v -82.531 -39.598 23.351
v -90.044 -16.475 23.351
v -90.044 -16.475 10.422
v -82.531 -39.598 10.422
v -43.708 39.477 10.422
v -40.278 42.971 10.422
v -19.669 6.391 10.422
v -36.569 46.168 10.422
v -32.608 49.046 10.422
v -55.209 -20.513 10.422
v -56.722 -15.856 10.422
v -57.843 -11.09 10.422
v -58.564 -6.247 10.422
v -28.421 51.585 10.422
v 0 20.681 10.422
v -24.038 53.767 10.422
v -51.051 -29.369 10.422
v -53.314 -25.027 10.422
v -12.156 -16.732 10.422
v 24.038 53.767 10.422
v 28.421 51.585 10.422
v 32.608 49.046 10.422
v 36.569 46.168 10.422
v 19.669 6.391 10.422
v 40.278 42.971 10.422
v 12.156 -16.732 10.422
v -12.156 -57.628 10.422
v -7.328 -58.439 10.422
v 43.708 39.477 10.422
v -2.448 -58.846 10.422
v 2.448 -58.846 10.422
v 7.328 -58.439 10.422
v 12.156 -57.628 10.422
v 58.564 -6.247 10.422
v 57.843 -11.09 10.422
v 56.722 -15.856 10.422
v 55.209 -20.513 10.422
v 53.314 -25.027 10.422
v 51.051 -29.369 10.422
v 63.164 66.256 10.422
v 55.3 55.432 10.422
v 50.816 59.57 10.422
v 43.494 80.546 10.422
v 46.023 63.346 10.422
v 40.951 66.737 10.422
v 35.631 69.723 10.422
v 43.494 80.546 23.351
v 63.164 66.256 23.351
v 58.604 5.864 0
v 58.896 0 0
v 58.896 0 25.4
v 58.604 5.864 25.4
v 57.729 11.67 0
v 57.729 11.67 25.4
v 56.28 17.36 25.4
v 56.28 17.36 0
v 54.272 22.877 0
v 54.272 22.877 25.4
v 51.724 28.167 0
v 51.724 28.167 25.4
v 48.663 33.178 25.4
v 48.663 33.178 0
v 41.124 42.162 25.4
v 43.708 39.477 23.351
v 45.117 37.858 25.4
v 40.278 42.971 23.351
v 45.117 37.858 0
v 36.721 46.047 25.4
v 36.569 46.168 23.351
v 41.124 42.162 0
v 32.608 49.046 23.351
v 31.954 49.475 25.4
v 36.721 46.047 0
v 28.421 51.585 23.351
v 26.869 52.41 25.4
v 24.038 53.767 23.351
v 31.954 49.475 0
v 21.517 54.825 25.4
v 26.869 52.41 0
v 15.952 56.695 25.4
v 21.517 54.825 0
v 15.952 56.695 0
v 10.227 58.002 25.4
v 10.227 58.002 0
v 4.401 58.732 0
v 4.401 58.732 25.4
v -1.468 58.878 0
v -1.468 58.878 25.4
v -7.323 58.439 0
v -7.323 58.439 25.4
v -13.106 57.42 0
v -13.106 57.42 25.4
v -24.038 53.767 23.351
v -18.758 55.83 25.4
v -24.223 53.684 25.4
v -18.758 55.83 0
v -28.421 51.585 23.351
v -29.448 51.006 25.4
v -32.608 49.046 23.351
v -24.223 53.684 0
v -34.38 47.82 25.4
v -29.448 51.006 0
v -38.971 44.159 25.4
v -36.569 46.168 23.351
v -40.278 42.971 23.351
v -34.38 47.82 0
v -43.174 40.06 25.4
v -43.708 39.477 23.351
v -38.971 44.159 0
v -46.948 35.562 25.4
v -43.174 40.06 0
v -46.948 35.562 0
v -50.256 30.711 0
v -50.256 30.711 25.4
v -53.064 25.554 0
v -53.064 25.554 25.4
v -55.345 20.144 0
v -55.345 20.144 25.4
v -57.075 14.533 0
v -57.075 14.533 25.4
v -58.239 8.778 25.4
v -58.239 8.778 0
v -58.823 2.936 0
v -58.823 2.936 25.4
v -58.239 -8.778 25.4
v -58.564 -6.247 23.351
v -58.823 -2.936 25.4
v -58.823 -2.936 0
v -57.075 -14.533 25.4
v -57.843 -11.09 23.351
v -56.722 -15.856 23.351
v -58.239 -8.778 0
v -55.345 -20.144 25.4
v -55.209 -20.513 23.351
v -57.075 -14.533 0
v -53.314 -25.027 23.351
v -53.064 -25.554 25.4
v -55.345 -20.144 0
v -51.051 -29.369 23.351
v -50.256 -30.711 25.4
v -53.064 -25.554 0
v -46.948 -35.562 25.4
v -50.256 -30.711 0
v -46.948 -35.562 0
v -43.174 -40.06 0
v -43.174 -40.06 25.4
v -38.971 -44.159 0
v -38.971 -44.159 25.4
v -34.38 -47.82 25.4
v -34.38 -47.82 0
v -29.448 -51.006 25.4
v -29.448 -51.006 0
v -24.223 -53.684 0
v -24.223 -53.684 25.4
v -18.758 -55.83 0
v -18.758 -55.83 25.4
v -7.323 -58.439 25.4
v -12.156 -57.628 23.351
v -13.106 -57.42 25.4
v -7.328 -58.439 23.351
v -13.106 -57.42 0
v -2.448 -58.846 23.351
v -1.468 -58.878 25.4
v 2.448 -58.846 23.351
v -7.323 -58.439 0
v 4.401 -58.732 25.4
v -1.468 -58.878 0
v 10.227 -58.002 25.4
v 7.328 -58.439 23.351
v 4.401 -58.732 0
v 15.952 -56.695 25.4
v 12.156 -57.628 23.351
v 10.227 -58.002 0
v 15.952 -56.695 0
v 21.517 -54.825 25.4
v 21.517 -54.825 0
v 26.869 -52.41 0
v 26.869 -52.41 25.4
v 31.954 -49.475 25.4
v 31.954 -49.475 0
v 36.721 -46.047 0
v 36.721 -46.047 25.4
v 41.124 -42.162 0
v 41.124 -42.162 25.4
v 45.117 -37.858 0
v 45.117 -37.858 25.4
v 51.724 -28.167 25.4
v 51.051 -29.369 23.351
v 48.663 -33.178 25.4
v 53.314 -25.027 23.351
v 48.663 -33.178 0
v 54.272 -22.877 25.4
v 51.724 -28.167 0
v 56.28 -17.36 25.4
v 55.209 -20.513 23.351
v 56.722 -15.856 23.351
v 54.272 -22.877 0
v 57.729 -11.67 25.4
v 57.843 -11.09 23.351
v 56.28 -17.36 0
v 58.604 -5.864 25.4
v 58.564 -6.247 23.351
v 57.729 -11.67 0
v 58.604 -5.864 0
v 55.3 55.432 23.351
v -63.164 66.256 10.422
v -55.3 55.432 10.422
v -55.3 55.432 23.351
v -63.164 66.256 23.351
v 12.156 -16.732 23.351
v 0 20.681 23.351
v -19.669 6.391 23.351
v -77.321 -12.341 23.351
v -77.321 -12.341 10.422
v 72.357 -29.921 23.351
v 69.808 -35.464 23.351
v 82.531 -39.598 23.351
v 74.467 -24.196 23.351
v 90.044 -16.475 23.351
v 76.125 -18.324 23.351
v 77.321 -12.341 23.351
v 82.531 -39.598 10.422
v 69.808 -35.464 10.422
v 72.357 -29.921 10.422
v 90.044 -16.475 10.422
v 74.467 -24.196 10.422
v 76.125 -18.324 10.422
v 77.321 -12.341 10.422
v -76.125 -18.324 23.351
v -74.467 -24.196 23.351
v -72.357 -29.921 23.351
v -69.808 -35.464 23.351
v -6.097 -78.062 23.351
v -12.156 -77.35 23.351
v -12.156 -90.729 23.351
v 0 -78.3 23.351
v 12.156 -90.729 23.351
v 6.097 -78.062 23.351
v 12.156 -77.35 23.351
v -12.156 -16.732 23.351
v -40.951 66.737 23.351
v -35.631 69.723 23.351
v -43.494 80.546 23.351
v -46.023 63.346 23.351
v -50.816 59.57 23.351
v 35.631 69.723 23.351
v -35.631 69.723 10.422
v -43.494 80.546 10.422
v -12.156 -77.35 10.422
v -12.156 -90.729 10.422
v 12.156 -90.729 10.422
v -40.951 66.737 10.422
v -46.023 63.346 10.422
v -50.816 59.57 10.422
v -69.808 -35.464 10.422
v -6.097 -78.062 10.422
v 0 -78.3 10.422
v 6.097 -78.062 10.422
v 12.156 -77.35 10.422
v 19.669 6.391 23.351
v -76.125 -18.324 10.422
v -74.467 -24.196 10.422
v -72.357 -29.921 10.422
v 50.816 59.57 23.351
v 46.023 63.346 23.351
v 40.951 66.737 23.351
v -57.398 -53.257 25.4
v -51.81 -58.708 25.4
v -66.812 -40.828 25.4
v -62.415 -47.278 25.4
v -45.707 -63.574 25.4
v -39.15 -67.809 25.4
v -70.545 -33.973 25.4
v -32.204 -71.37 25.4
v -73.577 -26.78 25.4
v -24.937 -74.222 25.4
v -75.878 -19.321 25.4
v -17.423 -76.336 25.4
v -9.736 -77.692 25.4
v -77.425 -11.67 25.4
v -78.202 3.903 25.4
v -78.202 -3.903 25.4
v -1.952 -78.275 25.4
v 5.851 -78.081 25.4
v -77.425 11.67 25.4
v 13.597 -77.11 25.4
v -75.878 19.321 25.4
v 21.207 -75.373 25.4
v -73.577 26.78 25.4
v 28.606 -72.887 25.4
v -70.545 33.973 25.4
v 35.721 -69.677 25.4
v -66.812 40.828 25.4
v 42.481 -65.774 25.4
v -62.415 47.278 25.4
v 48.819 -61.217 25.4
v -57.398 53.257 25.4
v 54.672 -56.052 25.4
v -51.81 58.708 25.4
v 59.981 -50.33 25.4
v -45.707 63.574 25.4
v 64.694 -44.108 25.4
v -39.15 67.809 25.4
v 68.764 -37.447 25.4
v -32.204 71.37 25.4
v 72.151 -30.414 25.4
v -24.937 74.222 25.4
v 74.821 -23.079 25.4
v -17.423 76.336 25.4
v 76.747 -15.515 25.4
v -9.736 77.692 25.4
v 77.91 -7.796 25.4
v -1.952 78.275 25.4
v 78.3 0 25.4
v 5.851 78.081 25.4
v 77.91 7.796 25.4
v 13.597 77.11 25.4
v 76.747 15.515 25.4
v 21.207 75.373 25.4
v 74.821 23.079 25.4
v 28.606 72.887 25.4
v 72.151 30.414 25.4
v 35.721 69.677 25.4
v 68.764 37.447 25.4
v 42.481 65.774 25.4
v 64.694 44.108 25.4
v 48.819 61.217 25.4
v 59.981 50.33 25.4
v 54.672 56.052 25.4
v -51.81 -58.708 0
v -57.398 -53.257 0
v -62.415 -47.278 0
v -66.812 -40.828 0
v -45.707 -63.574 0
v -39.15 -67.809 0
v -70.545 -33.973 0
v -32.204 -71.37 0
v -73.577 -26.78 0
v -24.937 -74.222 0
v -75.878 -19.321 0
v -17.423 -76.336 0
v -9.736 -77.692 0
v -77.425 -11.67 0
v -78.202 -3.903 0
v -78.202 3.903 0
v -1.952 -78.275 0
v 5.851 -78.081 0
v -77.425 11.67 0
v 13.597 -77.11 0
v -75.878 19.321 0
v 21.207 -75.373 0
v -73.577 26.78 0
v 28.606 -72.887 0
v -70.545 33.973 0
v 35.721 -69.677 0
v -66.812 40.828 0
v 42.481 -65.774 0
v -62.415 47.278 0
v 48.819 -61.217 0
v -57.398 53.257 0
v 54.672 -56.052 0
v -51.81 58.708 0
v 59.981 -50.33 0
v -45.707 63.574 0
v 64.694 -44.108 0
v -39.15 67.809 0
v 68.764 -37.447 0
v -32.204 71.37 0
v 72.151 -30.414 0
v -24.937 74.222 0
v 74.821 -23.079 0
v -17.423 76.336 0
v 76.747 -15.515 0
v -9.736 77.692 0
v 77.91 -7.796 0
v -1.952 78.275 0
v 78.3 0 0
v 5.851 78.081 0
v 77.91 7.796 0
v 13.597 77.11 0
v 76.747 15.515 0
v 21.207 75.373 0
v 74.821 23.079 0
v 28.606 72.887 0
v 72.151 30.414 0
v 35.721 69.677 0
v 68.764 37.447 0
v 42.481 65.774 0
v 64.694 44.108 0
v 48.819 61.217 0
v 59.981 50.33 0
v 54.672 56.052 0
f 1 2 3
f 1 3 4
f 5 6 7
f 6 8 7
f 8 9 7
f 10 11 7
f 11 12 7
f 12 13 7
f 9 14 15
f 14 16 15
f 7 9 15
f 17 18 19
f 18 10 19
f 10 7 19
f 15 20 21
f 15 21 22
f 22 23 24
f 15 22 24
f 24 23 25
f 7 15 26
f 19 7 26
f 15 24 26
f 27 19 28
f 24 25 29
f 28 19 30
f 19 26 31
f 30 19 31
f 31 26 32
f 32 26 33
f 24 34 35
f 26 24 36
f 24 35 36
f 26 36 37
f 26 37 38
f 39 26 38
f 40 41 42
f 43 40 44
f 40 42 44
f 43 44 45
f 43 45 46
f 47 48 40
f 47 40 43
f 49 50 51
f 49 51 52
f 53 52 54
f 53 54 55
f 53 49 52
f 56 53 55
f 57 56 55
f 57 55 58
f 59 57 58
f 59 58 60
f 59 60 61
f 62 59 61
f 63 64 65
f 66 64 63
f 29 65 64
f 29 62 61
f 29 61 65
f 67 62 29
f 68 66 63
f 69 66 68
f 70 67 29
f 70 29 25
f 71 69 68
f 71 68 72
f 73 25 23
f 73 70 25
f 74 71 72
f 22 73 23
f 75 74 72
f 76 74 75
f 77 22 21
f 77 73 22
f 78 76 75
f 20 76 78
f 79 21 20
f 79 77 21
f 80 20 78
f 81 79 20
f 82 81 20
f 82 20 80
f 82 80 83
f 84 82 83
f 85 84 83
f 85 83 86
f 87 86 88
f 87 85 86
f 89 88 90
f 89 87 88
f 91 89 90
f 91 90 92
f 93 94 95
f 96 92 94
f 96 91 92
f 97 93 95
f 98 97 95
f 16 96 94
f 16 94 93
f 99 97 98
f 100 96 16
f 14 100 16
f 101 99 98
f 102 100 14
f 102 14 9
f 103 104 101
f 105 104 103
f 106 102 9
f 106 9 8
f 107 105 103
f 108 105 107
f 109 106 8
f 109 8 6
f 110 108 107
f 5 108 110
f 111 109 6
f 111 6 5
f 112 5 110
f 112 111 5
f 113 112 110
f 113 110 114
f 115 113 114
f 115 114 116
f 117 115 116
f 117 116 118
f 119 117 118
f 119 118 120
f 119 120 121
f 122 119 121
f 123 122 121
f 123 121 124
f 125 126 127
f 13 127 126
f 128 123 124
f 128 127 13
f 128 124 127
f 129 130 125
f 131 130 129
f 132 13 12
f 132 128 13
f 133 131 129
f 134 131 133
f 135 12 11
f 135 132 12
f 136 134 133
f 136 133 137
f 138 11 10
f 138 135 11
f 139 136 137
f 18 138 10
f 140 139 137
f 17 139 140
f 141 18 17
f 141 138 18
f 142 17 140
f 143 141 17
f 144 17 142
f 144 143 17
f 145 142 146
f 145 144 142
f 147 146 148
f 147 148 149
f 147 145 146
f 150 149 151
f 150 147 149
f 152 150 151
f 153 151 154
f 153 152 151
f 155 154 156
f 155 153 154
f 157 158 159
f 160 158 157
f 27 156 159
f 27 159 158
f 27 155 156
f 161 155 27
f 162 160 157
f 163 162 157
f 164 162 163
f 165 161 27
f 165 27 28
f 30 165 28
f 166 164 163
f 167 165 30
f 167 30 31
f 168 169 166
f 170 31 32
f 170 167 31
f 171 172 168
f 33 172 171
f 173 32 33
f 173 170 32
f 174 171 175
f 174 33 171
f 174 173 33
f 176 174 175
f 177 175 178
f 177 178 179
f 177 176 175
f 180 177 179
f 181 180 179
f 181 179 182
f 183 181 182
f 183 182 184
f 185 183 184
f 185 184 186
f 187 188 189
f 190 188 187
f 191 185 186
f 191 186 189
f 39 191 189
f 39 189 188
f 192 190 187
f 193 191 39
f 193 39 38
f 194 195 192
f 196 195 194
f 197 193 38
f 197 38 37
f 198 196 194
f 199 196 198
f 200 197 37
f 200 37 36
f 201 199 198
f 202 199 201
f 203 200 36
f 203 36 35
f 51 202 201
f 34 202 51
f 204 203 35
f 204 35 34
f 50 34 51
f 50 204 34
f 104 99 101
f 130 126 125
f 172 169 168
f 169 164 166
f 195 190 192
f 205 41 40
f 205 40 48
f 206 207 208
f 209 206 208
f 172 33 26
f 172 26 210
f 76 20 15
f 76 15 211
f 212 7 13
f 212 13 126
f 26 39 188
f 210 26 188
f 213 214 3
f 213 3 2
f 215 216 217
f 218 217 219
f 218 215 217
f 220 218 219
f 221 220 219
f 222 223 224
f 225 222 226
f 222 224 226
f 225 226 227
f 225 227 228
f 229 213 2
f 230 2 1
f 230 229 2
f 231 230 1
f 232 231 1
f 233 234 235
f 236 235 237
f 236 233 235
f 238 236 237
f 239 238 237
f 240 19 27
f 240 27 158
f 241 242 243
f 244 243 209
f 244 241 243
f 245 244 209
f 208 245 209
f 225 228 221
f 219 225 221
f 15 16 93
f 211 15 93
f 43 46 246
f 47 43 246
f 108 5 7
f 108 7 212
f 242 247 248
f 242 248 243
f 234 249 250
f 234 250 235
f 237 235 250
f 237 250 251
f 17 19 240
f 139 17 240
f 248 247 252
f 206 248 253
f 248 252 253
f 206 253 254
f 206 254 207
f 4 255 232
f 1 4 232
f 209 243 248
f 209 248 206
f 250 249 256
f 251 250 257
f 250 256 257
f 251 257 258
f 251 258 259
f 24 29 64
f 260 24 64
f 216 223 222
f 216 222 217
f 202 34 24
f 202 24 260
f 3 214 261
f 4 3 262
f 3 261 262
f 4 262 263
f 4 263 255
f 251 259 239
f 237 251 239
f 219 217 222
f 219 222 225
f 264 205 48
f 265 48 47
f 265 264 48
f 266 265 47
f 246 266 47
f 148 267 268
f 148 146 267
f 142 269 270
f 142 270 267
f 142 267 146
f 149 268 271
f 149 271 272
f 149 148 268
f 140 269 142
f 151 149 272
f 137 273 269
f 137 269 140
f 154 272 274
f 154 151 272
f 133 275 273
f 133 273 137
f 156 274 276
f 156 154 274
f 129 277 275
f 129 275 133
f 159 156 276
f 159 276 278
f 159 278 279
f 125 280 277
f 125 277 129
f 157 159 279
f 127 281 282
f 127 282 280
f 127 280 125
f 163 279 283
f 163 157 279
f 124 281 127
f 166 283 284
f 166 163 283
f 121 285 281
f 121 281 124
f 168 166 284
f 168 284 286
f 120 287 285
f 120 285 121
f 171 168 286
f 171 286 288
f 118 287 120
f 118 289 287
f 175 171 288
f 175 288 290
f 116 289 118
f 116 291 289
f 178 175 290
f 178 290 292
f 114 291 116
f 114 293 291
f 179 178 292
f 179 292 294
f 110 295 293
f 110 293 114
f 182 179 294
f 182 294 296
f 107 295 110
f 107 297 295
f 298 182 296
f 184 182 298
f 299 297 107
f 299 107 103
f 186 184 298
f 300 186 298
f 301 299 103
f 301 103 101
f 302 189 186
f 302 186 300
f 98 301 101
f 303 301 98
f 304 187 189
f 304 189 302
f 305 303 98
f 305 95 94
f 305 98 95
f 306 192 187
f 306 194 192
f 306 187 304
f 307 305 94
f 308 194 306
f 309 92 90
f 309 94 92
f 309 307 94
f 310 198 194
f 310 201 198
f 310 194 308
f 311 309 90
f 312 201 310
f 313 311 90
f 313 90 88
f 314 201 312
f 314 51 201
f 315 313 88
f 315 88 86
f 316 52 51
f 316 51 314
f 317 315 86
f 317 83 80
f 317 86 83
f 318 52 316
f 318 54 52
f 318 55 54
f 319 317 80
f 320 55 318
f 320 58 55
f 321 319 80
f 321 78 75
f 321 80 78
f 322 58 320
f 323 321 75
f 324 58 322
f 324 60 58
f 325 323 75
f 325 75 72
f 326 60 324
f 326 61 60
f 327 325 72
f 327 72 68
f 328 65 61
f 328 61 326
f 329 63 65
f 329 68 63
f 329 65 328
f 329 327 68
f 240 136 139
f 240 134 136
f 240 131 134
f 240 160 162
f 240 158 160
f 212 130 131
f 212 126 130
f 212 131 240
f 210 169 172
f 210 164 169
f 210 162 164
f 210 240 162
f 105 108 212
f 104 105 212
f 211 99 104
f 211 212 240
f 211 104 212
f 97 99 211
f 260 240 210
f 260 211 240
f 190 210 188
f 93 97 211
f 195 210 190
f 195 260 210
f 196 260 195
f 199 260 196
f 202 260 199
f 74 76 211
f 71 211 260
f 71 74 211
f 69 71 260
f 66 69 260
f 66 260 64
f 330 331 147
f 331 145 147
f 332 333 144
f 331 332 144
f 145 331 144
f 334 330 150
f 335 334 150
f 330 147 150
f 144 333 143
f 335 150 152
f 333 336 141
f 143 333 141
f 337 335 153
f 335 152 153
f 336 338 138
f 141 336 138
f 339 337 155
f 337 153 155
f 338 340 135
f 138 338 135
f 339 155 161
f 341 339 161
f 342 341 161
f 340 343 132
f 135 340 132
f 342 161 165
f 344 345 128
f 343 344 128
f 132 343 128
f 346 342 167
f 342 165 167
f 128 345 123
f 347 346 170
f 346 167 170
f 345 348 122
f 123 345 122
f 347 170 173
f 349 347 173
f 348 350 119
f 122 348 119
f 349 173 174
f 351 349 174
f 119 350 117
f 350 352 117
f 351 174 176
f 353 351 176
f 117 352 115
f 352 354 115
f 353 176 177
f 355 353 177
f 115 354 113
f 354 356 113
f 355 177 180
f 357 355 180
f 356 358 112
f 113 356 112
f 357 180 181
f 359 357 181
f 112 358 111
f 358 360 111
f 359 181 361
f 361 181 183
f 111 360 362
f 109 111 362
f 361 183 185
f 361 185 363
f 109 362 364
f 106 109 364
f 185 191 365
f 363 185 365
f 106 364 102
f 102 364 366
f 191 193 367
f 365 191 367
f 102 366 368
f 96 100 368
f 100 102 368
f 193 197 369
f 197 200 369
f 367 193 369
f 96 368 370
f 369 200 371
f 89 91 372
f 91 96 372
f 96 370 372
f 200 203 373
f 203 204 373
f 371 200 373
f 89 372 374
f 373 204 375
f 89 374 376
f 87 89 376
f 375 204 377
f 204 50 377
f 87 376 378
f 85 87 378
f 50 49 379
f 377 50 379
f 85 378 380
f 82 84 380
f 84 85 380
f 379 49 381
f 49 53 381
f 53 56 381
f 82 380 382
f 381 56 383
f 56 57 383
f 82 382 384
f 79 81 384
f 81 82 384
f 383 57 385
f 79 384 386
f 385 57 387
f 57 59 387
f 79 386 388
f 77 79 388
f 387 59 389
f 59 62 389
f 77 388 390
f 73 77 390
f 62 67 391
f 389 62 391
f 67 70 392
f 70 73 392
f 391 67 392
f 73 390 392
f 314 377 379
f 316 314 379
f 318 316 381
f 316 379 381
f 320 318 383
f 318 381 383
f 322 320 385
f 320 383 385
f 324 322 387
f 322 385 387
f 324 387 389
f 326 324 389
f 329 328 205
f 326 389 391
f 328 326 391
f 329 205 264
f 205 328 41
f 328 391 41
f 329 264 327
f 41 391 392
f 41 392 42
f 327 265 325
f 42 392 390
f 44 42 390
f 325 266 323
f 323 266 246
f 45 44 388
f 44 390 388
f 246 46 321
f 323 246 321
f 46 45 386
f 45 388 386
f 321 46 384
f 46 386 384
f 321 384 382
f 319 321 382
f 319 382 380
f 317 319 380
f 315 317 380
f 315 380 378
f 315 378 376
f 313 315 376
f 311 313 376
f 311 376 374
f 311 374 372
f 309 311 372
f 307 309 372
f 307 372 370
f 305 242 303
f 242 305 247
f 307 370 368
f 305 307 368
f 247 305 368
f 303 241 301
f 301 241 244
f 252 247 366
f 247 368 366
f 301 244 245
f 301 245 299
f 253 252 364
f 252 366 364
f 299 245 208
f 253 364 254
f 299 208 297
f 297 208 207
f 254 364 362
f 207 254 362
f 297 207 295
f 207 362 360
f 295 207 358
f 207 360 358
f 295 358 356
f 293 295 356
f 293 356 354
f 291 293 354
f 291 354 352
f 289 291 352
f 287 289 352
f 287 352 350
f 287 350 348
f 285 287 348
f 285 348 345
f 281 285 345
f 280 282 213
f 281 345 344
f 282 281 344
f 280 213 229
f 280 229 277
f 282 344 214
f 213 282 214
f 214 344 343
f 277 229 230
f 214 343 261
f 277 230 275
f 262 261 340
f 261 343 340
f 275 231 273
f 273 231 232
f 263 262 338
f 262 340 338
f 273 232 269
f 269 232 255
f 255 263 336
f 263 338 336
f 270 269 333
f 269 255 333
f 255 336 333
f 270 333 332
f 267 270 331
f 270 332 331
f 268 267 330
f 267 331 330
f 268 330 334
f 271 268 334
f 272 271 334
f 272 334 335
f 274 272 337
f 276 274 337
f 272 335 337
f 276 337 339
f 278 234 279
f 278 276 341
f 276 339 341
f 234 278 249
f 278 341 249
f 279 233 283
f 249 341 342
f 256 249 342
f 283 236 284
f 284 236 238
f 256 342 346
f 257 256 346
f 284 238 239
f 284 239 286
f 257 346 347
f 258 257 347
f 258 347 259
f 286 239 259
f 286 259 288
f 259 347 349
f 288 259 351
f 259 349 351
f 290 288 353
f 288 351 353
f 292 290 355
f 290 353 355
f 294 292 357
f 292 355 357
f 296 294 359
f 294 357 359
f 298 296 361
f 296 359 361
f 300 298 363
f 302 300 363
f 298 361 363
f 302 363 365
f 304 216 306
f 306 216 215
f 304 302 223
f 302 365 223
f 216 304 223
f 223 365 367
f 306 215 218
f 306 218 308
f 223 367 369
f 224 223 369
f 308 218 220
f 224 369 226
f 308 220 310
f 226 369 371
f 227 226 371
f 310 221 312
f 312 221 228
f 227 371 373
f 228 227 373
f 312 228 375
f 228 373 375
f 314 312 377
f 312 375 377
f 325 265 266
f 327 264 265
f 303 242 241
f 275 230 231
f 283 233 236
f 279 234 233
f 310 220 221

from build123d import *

# Parameters (mm, degrees)
F0_R            = 78.299536584
F0_R_2          = 58.8964149972
F1_DEPTH        = 25.4
F2_W            = 24.3125222623
F2_H            = 12.9293575883
F3_DEPTH        = 90.7285287976
F3_COPIES_COUNT = 5


# Not quite as in the source:
# - a pattern or mirror of a feature is missing from the dataset's text; its kind, count and spacing are read off the source's solid


with BuildPart() as f1:
    # F0 (on Top) → F1 (new body)
    with BuildSketch(Plane.XY):
        Circle(F0_R)
        Circle(F0_R_2, mode=Mode.SUBTRACT)
    extrude(amount=F1_DEPTH)

    # F2 (on Front) → F3 (join)
    with BuildSketch(Plane.XZ):
        with Locations((0, 16.8866589665)):
            Rectangle(F2_W, F2_H)
    f3 = extrude(amount=F3_DEPTH)

    # F3_copies: F3 ×5 about axis
    f3_copies_axis = Axis((0, 0, 0), (0, 0, 1))
    for i in range(1, F3_COPIES_COUNT):
        add(f3.rotate(f3_copies_axis, i * 360 / F3_COPIES_COUNT))


solid = f1.part
